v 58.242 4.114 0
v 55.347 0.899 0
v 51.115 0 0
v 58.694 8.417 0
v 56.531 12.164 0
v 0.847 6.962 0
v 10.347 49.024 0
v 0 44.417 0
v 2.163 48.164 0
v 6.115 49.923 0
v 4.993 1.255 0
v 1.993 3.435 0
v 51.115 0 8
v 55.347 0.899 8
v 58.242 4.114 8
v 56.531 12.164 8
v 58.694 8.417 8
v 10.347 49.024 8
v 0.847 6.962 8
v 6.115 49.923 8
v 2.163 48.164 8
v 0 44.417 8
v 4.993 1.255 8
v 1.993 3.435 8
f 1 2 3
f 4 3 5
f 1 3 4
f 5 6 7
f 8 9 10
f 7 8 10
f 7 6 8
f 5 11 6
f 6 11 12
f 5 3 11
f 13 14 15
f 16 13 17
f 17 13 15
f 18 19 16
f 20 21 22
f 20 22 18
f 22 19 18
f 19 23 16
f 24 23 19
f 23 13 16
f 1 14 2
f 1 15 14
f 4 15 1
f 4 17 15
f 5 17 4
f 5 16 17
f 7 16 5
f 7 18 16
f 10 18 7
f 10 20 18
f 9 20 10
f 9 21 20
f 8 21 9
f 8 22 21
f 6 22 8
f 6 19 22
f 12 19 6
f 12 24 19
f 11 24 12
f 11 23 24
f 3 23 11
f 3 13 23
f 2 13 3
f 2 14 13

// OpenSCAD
$fn = 32;

// ----------------------------------------------------------------------
// Lever arm: two bosses 12 and 14 mm, 45 mm between centres
// ----------------------------------------------------------------------

// --- parameters (mm) ---
profile_height = 8;       // extrusion height
profile_points = 12;      // points of the closed outline

profile = [[0, 44.417], [0.847, 6.962], [1.993, 3.435], [4.993, 1.255], [51.115, 0], [55.347, 0.899], [58.242, 4.114], [58.694, 8.417], [56.531, 12.164], [10.347, 49.024], [6.115, 49.923], [2.163, 48.164]];  // single closed polygon, 12 points, counter clockwise

// --- the one profile operation ---
linear_extrude(height = profile_height) polygon(points = profile);
